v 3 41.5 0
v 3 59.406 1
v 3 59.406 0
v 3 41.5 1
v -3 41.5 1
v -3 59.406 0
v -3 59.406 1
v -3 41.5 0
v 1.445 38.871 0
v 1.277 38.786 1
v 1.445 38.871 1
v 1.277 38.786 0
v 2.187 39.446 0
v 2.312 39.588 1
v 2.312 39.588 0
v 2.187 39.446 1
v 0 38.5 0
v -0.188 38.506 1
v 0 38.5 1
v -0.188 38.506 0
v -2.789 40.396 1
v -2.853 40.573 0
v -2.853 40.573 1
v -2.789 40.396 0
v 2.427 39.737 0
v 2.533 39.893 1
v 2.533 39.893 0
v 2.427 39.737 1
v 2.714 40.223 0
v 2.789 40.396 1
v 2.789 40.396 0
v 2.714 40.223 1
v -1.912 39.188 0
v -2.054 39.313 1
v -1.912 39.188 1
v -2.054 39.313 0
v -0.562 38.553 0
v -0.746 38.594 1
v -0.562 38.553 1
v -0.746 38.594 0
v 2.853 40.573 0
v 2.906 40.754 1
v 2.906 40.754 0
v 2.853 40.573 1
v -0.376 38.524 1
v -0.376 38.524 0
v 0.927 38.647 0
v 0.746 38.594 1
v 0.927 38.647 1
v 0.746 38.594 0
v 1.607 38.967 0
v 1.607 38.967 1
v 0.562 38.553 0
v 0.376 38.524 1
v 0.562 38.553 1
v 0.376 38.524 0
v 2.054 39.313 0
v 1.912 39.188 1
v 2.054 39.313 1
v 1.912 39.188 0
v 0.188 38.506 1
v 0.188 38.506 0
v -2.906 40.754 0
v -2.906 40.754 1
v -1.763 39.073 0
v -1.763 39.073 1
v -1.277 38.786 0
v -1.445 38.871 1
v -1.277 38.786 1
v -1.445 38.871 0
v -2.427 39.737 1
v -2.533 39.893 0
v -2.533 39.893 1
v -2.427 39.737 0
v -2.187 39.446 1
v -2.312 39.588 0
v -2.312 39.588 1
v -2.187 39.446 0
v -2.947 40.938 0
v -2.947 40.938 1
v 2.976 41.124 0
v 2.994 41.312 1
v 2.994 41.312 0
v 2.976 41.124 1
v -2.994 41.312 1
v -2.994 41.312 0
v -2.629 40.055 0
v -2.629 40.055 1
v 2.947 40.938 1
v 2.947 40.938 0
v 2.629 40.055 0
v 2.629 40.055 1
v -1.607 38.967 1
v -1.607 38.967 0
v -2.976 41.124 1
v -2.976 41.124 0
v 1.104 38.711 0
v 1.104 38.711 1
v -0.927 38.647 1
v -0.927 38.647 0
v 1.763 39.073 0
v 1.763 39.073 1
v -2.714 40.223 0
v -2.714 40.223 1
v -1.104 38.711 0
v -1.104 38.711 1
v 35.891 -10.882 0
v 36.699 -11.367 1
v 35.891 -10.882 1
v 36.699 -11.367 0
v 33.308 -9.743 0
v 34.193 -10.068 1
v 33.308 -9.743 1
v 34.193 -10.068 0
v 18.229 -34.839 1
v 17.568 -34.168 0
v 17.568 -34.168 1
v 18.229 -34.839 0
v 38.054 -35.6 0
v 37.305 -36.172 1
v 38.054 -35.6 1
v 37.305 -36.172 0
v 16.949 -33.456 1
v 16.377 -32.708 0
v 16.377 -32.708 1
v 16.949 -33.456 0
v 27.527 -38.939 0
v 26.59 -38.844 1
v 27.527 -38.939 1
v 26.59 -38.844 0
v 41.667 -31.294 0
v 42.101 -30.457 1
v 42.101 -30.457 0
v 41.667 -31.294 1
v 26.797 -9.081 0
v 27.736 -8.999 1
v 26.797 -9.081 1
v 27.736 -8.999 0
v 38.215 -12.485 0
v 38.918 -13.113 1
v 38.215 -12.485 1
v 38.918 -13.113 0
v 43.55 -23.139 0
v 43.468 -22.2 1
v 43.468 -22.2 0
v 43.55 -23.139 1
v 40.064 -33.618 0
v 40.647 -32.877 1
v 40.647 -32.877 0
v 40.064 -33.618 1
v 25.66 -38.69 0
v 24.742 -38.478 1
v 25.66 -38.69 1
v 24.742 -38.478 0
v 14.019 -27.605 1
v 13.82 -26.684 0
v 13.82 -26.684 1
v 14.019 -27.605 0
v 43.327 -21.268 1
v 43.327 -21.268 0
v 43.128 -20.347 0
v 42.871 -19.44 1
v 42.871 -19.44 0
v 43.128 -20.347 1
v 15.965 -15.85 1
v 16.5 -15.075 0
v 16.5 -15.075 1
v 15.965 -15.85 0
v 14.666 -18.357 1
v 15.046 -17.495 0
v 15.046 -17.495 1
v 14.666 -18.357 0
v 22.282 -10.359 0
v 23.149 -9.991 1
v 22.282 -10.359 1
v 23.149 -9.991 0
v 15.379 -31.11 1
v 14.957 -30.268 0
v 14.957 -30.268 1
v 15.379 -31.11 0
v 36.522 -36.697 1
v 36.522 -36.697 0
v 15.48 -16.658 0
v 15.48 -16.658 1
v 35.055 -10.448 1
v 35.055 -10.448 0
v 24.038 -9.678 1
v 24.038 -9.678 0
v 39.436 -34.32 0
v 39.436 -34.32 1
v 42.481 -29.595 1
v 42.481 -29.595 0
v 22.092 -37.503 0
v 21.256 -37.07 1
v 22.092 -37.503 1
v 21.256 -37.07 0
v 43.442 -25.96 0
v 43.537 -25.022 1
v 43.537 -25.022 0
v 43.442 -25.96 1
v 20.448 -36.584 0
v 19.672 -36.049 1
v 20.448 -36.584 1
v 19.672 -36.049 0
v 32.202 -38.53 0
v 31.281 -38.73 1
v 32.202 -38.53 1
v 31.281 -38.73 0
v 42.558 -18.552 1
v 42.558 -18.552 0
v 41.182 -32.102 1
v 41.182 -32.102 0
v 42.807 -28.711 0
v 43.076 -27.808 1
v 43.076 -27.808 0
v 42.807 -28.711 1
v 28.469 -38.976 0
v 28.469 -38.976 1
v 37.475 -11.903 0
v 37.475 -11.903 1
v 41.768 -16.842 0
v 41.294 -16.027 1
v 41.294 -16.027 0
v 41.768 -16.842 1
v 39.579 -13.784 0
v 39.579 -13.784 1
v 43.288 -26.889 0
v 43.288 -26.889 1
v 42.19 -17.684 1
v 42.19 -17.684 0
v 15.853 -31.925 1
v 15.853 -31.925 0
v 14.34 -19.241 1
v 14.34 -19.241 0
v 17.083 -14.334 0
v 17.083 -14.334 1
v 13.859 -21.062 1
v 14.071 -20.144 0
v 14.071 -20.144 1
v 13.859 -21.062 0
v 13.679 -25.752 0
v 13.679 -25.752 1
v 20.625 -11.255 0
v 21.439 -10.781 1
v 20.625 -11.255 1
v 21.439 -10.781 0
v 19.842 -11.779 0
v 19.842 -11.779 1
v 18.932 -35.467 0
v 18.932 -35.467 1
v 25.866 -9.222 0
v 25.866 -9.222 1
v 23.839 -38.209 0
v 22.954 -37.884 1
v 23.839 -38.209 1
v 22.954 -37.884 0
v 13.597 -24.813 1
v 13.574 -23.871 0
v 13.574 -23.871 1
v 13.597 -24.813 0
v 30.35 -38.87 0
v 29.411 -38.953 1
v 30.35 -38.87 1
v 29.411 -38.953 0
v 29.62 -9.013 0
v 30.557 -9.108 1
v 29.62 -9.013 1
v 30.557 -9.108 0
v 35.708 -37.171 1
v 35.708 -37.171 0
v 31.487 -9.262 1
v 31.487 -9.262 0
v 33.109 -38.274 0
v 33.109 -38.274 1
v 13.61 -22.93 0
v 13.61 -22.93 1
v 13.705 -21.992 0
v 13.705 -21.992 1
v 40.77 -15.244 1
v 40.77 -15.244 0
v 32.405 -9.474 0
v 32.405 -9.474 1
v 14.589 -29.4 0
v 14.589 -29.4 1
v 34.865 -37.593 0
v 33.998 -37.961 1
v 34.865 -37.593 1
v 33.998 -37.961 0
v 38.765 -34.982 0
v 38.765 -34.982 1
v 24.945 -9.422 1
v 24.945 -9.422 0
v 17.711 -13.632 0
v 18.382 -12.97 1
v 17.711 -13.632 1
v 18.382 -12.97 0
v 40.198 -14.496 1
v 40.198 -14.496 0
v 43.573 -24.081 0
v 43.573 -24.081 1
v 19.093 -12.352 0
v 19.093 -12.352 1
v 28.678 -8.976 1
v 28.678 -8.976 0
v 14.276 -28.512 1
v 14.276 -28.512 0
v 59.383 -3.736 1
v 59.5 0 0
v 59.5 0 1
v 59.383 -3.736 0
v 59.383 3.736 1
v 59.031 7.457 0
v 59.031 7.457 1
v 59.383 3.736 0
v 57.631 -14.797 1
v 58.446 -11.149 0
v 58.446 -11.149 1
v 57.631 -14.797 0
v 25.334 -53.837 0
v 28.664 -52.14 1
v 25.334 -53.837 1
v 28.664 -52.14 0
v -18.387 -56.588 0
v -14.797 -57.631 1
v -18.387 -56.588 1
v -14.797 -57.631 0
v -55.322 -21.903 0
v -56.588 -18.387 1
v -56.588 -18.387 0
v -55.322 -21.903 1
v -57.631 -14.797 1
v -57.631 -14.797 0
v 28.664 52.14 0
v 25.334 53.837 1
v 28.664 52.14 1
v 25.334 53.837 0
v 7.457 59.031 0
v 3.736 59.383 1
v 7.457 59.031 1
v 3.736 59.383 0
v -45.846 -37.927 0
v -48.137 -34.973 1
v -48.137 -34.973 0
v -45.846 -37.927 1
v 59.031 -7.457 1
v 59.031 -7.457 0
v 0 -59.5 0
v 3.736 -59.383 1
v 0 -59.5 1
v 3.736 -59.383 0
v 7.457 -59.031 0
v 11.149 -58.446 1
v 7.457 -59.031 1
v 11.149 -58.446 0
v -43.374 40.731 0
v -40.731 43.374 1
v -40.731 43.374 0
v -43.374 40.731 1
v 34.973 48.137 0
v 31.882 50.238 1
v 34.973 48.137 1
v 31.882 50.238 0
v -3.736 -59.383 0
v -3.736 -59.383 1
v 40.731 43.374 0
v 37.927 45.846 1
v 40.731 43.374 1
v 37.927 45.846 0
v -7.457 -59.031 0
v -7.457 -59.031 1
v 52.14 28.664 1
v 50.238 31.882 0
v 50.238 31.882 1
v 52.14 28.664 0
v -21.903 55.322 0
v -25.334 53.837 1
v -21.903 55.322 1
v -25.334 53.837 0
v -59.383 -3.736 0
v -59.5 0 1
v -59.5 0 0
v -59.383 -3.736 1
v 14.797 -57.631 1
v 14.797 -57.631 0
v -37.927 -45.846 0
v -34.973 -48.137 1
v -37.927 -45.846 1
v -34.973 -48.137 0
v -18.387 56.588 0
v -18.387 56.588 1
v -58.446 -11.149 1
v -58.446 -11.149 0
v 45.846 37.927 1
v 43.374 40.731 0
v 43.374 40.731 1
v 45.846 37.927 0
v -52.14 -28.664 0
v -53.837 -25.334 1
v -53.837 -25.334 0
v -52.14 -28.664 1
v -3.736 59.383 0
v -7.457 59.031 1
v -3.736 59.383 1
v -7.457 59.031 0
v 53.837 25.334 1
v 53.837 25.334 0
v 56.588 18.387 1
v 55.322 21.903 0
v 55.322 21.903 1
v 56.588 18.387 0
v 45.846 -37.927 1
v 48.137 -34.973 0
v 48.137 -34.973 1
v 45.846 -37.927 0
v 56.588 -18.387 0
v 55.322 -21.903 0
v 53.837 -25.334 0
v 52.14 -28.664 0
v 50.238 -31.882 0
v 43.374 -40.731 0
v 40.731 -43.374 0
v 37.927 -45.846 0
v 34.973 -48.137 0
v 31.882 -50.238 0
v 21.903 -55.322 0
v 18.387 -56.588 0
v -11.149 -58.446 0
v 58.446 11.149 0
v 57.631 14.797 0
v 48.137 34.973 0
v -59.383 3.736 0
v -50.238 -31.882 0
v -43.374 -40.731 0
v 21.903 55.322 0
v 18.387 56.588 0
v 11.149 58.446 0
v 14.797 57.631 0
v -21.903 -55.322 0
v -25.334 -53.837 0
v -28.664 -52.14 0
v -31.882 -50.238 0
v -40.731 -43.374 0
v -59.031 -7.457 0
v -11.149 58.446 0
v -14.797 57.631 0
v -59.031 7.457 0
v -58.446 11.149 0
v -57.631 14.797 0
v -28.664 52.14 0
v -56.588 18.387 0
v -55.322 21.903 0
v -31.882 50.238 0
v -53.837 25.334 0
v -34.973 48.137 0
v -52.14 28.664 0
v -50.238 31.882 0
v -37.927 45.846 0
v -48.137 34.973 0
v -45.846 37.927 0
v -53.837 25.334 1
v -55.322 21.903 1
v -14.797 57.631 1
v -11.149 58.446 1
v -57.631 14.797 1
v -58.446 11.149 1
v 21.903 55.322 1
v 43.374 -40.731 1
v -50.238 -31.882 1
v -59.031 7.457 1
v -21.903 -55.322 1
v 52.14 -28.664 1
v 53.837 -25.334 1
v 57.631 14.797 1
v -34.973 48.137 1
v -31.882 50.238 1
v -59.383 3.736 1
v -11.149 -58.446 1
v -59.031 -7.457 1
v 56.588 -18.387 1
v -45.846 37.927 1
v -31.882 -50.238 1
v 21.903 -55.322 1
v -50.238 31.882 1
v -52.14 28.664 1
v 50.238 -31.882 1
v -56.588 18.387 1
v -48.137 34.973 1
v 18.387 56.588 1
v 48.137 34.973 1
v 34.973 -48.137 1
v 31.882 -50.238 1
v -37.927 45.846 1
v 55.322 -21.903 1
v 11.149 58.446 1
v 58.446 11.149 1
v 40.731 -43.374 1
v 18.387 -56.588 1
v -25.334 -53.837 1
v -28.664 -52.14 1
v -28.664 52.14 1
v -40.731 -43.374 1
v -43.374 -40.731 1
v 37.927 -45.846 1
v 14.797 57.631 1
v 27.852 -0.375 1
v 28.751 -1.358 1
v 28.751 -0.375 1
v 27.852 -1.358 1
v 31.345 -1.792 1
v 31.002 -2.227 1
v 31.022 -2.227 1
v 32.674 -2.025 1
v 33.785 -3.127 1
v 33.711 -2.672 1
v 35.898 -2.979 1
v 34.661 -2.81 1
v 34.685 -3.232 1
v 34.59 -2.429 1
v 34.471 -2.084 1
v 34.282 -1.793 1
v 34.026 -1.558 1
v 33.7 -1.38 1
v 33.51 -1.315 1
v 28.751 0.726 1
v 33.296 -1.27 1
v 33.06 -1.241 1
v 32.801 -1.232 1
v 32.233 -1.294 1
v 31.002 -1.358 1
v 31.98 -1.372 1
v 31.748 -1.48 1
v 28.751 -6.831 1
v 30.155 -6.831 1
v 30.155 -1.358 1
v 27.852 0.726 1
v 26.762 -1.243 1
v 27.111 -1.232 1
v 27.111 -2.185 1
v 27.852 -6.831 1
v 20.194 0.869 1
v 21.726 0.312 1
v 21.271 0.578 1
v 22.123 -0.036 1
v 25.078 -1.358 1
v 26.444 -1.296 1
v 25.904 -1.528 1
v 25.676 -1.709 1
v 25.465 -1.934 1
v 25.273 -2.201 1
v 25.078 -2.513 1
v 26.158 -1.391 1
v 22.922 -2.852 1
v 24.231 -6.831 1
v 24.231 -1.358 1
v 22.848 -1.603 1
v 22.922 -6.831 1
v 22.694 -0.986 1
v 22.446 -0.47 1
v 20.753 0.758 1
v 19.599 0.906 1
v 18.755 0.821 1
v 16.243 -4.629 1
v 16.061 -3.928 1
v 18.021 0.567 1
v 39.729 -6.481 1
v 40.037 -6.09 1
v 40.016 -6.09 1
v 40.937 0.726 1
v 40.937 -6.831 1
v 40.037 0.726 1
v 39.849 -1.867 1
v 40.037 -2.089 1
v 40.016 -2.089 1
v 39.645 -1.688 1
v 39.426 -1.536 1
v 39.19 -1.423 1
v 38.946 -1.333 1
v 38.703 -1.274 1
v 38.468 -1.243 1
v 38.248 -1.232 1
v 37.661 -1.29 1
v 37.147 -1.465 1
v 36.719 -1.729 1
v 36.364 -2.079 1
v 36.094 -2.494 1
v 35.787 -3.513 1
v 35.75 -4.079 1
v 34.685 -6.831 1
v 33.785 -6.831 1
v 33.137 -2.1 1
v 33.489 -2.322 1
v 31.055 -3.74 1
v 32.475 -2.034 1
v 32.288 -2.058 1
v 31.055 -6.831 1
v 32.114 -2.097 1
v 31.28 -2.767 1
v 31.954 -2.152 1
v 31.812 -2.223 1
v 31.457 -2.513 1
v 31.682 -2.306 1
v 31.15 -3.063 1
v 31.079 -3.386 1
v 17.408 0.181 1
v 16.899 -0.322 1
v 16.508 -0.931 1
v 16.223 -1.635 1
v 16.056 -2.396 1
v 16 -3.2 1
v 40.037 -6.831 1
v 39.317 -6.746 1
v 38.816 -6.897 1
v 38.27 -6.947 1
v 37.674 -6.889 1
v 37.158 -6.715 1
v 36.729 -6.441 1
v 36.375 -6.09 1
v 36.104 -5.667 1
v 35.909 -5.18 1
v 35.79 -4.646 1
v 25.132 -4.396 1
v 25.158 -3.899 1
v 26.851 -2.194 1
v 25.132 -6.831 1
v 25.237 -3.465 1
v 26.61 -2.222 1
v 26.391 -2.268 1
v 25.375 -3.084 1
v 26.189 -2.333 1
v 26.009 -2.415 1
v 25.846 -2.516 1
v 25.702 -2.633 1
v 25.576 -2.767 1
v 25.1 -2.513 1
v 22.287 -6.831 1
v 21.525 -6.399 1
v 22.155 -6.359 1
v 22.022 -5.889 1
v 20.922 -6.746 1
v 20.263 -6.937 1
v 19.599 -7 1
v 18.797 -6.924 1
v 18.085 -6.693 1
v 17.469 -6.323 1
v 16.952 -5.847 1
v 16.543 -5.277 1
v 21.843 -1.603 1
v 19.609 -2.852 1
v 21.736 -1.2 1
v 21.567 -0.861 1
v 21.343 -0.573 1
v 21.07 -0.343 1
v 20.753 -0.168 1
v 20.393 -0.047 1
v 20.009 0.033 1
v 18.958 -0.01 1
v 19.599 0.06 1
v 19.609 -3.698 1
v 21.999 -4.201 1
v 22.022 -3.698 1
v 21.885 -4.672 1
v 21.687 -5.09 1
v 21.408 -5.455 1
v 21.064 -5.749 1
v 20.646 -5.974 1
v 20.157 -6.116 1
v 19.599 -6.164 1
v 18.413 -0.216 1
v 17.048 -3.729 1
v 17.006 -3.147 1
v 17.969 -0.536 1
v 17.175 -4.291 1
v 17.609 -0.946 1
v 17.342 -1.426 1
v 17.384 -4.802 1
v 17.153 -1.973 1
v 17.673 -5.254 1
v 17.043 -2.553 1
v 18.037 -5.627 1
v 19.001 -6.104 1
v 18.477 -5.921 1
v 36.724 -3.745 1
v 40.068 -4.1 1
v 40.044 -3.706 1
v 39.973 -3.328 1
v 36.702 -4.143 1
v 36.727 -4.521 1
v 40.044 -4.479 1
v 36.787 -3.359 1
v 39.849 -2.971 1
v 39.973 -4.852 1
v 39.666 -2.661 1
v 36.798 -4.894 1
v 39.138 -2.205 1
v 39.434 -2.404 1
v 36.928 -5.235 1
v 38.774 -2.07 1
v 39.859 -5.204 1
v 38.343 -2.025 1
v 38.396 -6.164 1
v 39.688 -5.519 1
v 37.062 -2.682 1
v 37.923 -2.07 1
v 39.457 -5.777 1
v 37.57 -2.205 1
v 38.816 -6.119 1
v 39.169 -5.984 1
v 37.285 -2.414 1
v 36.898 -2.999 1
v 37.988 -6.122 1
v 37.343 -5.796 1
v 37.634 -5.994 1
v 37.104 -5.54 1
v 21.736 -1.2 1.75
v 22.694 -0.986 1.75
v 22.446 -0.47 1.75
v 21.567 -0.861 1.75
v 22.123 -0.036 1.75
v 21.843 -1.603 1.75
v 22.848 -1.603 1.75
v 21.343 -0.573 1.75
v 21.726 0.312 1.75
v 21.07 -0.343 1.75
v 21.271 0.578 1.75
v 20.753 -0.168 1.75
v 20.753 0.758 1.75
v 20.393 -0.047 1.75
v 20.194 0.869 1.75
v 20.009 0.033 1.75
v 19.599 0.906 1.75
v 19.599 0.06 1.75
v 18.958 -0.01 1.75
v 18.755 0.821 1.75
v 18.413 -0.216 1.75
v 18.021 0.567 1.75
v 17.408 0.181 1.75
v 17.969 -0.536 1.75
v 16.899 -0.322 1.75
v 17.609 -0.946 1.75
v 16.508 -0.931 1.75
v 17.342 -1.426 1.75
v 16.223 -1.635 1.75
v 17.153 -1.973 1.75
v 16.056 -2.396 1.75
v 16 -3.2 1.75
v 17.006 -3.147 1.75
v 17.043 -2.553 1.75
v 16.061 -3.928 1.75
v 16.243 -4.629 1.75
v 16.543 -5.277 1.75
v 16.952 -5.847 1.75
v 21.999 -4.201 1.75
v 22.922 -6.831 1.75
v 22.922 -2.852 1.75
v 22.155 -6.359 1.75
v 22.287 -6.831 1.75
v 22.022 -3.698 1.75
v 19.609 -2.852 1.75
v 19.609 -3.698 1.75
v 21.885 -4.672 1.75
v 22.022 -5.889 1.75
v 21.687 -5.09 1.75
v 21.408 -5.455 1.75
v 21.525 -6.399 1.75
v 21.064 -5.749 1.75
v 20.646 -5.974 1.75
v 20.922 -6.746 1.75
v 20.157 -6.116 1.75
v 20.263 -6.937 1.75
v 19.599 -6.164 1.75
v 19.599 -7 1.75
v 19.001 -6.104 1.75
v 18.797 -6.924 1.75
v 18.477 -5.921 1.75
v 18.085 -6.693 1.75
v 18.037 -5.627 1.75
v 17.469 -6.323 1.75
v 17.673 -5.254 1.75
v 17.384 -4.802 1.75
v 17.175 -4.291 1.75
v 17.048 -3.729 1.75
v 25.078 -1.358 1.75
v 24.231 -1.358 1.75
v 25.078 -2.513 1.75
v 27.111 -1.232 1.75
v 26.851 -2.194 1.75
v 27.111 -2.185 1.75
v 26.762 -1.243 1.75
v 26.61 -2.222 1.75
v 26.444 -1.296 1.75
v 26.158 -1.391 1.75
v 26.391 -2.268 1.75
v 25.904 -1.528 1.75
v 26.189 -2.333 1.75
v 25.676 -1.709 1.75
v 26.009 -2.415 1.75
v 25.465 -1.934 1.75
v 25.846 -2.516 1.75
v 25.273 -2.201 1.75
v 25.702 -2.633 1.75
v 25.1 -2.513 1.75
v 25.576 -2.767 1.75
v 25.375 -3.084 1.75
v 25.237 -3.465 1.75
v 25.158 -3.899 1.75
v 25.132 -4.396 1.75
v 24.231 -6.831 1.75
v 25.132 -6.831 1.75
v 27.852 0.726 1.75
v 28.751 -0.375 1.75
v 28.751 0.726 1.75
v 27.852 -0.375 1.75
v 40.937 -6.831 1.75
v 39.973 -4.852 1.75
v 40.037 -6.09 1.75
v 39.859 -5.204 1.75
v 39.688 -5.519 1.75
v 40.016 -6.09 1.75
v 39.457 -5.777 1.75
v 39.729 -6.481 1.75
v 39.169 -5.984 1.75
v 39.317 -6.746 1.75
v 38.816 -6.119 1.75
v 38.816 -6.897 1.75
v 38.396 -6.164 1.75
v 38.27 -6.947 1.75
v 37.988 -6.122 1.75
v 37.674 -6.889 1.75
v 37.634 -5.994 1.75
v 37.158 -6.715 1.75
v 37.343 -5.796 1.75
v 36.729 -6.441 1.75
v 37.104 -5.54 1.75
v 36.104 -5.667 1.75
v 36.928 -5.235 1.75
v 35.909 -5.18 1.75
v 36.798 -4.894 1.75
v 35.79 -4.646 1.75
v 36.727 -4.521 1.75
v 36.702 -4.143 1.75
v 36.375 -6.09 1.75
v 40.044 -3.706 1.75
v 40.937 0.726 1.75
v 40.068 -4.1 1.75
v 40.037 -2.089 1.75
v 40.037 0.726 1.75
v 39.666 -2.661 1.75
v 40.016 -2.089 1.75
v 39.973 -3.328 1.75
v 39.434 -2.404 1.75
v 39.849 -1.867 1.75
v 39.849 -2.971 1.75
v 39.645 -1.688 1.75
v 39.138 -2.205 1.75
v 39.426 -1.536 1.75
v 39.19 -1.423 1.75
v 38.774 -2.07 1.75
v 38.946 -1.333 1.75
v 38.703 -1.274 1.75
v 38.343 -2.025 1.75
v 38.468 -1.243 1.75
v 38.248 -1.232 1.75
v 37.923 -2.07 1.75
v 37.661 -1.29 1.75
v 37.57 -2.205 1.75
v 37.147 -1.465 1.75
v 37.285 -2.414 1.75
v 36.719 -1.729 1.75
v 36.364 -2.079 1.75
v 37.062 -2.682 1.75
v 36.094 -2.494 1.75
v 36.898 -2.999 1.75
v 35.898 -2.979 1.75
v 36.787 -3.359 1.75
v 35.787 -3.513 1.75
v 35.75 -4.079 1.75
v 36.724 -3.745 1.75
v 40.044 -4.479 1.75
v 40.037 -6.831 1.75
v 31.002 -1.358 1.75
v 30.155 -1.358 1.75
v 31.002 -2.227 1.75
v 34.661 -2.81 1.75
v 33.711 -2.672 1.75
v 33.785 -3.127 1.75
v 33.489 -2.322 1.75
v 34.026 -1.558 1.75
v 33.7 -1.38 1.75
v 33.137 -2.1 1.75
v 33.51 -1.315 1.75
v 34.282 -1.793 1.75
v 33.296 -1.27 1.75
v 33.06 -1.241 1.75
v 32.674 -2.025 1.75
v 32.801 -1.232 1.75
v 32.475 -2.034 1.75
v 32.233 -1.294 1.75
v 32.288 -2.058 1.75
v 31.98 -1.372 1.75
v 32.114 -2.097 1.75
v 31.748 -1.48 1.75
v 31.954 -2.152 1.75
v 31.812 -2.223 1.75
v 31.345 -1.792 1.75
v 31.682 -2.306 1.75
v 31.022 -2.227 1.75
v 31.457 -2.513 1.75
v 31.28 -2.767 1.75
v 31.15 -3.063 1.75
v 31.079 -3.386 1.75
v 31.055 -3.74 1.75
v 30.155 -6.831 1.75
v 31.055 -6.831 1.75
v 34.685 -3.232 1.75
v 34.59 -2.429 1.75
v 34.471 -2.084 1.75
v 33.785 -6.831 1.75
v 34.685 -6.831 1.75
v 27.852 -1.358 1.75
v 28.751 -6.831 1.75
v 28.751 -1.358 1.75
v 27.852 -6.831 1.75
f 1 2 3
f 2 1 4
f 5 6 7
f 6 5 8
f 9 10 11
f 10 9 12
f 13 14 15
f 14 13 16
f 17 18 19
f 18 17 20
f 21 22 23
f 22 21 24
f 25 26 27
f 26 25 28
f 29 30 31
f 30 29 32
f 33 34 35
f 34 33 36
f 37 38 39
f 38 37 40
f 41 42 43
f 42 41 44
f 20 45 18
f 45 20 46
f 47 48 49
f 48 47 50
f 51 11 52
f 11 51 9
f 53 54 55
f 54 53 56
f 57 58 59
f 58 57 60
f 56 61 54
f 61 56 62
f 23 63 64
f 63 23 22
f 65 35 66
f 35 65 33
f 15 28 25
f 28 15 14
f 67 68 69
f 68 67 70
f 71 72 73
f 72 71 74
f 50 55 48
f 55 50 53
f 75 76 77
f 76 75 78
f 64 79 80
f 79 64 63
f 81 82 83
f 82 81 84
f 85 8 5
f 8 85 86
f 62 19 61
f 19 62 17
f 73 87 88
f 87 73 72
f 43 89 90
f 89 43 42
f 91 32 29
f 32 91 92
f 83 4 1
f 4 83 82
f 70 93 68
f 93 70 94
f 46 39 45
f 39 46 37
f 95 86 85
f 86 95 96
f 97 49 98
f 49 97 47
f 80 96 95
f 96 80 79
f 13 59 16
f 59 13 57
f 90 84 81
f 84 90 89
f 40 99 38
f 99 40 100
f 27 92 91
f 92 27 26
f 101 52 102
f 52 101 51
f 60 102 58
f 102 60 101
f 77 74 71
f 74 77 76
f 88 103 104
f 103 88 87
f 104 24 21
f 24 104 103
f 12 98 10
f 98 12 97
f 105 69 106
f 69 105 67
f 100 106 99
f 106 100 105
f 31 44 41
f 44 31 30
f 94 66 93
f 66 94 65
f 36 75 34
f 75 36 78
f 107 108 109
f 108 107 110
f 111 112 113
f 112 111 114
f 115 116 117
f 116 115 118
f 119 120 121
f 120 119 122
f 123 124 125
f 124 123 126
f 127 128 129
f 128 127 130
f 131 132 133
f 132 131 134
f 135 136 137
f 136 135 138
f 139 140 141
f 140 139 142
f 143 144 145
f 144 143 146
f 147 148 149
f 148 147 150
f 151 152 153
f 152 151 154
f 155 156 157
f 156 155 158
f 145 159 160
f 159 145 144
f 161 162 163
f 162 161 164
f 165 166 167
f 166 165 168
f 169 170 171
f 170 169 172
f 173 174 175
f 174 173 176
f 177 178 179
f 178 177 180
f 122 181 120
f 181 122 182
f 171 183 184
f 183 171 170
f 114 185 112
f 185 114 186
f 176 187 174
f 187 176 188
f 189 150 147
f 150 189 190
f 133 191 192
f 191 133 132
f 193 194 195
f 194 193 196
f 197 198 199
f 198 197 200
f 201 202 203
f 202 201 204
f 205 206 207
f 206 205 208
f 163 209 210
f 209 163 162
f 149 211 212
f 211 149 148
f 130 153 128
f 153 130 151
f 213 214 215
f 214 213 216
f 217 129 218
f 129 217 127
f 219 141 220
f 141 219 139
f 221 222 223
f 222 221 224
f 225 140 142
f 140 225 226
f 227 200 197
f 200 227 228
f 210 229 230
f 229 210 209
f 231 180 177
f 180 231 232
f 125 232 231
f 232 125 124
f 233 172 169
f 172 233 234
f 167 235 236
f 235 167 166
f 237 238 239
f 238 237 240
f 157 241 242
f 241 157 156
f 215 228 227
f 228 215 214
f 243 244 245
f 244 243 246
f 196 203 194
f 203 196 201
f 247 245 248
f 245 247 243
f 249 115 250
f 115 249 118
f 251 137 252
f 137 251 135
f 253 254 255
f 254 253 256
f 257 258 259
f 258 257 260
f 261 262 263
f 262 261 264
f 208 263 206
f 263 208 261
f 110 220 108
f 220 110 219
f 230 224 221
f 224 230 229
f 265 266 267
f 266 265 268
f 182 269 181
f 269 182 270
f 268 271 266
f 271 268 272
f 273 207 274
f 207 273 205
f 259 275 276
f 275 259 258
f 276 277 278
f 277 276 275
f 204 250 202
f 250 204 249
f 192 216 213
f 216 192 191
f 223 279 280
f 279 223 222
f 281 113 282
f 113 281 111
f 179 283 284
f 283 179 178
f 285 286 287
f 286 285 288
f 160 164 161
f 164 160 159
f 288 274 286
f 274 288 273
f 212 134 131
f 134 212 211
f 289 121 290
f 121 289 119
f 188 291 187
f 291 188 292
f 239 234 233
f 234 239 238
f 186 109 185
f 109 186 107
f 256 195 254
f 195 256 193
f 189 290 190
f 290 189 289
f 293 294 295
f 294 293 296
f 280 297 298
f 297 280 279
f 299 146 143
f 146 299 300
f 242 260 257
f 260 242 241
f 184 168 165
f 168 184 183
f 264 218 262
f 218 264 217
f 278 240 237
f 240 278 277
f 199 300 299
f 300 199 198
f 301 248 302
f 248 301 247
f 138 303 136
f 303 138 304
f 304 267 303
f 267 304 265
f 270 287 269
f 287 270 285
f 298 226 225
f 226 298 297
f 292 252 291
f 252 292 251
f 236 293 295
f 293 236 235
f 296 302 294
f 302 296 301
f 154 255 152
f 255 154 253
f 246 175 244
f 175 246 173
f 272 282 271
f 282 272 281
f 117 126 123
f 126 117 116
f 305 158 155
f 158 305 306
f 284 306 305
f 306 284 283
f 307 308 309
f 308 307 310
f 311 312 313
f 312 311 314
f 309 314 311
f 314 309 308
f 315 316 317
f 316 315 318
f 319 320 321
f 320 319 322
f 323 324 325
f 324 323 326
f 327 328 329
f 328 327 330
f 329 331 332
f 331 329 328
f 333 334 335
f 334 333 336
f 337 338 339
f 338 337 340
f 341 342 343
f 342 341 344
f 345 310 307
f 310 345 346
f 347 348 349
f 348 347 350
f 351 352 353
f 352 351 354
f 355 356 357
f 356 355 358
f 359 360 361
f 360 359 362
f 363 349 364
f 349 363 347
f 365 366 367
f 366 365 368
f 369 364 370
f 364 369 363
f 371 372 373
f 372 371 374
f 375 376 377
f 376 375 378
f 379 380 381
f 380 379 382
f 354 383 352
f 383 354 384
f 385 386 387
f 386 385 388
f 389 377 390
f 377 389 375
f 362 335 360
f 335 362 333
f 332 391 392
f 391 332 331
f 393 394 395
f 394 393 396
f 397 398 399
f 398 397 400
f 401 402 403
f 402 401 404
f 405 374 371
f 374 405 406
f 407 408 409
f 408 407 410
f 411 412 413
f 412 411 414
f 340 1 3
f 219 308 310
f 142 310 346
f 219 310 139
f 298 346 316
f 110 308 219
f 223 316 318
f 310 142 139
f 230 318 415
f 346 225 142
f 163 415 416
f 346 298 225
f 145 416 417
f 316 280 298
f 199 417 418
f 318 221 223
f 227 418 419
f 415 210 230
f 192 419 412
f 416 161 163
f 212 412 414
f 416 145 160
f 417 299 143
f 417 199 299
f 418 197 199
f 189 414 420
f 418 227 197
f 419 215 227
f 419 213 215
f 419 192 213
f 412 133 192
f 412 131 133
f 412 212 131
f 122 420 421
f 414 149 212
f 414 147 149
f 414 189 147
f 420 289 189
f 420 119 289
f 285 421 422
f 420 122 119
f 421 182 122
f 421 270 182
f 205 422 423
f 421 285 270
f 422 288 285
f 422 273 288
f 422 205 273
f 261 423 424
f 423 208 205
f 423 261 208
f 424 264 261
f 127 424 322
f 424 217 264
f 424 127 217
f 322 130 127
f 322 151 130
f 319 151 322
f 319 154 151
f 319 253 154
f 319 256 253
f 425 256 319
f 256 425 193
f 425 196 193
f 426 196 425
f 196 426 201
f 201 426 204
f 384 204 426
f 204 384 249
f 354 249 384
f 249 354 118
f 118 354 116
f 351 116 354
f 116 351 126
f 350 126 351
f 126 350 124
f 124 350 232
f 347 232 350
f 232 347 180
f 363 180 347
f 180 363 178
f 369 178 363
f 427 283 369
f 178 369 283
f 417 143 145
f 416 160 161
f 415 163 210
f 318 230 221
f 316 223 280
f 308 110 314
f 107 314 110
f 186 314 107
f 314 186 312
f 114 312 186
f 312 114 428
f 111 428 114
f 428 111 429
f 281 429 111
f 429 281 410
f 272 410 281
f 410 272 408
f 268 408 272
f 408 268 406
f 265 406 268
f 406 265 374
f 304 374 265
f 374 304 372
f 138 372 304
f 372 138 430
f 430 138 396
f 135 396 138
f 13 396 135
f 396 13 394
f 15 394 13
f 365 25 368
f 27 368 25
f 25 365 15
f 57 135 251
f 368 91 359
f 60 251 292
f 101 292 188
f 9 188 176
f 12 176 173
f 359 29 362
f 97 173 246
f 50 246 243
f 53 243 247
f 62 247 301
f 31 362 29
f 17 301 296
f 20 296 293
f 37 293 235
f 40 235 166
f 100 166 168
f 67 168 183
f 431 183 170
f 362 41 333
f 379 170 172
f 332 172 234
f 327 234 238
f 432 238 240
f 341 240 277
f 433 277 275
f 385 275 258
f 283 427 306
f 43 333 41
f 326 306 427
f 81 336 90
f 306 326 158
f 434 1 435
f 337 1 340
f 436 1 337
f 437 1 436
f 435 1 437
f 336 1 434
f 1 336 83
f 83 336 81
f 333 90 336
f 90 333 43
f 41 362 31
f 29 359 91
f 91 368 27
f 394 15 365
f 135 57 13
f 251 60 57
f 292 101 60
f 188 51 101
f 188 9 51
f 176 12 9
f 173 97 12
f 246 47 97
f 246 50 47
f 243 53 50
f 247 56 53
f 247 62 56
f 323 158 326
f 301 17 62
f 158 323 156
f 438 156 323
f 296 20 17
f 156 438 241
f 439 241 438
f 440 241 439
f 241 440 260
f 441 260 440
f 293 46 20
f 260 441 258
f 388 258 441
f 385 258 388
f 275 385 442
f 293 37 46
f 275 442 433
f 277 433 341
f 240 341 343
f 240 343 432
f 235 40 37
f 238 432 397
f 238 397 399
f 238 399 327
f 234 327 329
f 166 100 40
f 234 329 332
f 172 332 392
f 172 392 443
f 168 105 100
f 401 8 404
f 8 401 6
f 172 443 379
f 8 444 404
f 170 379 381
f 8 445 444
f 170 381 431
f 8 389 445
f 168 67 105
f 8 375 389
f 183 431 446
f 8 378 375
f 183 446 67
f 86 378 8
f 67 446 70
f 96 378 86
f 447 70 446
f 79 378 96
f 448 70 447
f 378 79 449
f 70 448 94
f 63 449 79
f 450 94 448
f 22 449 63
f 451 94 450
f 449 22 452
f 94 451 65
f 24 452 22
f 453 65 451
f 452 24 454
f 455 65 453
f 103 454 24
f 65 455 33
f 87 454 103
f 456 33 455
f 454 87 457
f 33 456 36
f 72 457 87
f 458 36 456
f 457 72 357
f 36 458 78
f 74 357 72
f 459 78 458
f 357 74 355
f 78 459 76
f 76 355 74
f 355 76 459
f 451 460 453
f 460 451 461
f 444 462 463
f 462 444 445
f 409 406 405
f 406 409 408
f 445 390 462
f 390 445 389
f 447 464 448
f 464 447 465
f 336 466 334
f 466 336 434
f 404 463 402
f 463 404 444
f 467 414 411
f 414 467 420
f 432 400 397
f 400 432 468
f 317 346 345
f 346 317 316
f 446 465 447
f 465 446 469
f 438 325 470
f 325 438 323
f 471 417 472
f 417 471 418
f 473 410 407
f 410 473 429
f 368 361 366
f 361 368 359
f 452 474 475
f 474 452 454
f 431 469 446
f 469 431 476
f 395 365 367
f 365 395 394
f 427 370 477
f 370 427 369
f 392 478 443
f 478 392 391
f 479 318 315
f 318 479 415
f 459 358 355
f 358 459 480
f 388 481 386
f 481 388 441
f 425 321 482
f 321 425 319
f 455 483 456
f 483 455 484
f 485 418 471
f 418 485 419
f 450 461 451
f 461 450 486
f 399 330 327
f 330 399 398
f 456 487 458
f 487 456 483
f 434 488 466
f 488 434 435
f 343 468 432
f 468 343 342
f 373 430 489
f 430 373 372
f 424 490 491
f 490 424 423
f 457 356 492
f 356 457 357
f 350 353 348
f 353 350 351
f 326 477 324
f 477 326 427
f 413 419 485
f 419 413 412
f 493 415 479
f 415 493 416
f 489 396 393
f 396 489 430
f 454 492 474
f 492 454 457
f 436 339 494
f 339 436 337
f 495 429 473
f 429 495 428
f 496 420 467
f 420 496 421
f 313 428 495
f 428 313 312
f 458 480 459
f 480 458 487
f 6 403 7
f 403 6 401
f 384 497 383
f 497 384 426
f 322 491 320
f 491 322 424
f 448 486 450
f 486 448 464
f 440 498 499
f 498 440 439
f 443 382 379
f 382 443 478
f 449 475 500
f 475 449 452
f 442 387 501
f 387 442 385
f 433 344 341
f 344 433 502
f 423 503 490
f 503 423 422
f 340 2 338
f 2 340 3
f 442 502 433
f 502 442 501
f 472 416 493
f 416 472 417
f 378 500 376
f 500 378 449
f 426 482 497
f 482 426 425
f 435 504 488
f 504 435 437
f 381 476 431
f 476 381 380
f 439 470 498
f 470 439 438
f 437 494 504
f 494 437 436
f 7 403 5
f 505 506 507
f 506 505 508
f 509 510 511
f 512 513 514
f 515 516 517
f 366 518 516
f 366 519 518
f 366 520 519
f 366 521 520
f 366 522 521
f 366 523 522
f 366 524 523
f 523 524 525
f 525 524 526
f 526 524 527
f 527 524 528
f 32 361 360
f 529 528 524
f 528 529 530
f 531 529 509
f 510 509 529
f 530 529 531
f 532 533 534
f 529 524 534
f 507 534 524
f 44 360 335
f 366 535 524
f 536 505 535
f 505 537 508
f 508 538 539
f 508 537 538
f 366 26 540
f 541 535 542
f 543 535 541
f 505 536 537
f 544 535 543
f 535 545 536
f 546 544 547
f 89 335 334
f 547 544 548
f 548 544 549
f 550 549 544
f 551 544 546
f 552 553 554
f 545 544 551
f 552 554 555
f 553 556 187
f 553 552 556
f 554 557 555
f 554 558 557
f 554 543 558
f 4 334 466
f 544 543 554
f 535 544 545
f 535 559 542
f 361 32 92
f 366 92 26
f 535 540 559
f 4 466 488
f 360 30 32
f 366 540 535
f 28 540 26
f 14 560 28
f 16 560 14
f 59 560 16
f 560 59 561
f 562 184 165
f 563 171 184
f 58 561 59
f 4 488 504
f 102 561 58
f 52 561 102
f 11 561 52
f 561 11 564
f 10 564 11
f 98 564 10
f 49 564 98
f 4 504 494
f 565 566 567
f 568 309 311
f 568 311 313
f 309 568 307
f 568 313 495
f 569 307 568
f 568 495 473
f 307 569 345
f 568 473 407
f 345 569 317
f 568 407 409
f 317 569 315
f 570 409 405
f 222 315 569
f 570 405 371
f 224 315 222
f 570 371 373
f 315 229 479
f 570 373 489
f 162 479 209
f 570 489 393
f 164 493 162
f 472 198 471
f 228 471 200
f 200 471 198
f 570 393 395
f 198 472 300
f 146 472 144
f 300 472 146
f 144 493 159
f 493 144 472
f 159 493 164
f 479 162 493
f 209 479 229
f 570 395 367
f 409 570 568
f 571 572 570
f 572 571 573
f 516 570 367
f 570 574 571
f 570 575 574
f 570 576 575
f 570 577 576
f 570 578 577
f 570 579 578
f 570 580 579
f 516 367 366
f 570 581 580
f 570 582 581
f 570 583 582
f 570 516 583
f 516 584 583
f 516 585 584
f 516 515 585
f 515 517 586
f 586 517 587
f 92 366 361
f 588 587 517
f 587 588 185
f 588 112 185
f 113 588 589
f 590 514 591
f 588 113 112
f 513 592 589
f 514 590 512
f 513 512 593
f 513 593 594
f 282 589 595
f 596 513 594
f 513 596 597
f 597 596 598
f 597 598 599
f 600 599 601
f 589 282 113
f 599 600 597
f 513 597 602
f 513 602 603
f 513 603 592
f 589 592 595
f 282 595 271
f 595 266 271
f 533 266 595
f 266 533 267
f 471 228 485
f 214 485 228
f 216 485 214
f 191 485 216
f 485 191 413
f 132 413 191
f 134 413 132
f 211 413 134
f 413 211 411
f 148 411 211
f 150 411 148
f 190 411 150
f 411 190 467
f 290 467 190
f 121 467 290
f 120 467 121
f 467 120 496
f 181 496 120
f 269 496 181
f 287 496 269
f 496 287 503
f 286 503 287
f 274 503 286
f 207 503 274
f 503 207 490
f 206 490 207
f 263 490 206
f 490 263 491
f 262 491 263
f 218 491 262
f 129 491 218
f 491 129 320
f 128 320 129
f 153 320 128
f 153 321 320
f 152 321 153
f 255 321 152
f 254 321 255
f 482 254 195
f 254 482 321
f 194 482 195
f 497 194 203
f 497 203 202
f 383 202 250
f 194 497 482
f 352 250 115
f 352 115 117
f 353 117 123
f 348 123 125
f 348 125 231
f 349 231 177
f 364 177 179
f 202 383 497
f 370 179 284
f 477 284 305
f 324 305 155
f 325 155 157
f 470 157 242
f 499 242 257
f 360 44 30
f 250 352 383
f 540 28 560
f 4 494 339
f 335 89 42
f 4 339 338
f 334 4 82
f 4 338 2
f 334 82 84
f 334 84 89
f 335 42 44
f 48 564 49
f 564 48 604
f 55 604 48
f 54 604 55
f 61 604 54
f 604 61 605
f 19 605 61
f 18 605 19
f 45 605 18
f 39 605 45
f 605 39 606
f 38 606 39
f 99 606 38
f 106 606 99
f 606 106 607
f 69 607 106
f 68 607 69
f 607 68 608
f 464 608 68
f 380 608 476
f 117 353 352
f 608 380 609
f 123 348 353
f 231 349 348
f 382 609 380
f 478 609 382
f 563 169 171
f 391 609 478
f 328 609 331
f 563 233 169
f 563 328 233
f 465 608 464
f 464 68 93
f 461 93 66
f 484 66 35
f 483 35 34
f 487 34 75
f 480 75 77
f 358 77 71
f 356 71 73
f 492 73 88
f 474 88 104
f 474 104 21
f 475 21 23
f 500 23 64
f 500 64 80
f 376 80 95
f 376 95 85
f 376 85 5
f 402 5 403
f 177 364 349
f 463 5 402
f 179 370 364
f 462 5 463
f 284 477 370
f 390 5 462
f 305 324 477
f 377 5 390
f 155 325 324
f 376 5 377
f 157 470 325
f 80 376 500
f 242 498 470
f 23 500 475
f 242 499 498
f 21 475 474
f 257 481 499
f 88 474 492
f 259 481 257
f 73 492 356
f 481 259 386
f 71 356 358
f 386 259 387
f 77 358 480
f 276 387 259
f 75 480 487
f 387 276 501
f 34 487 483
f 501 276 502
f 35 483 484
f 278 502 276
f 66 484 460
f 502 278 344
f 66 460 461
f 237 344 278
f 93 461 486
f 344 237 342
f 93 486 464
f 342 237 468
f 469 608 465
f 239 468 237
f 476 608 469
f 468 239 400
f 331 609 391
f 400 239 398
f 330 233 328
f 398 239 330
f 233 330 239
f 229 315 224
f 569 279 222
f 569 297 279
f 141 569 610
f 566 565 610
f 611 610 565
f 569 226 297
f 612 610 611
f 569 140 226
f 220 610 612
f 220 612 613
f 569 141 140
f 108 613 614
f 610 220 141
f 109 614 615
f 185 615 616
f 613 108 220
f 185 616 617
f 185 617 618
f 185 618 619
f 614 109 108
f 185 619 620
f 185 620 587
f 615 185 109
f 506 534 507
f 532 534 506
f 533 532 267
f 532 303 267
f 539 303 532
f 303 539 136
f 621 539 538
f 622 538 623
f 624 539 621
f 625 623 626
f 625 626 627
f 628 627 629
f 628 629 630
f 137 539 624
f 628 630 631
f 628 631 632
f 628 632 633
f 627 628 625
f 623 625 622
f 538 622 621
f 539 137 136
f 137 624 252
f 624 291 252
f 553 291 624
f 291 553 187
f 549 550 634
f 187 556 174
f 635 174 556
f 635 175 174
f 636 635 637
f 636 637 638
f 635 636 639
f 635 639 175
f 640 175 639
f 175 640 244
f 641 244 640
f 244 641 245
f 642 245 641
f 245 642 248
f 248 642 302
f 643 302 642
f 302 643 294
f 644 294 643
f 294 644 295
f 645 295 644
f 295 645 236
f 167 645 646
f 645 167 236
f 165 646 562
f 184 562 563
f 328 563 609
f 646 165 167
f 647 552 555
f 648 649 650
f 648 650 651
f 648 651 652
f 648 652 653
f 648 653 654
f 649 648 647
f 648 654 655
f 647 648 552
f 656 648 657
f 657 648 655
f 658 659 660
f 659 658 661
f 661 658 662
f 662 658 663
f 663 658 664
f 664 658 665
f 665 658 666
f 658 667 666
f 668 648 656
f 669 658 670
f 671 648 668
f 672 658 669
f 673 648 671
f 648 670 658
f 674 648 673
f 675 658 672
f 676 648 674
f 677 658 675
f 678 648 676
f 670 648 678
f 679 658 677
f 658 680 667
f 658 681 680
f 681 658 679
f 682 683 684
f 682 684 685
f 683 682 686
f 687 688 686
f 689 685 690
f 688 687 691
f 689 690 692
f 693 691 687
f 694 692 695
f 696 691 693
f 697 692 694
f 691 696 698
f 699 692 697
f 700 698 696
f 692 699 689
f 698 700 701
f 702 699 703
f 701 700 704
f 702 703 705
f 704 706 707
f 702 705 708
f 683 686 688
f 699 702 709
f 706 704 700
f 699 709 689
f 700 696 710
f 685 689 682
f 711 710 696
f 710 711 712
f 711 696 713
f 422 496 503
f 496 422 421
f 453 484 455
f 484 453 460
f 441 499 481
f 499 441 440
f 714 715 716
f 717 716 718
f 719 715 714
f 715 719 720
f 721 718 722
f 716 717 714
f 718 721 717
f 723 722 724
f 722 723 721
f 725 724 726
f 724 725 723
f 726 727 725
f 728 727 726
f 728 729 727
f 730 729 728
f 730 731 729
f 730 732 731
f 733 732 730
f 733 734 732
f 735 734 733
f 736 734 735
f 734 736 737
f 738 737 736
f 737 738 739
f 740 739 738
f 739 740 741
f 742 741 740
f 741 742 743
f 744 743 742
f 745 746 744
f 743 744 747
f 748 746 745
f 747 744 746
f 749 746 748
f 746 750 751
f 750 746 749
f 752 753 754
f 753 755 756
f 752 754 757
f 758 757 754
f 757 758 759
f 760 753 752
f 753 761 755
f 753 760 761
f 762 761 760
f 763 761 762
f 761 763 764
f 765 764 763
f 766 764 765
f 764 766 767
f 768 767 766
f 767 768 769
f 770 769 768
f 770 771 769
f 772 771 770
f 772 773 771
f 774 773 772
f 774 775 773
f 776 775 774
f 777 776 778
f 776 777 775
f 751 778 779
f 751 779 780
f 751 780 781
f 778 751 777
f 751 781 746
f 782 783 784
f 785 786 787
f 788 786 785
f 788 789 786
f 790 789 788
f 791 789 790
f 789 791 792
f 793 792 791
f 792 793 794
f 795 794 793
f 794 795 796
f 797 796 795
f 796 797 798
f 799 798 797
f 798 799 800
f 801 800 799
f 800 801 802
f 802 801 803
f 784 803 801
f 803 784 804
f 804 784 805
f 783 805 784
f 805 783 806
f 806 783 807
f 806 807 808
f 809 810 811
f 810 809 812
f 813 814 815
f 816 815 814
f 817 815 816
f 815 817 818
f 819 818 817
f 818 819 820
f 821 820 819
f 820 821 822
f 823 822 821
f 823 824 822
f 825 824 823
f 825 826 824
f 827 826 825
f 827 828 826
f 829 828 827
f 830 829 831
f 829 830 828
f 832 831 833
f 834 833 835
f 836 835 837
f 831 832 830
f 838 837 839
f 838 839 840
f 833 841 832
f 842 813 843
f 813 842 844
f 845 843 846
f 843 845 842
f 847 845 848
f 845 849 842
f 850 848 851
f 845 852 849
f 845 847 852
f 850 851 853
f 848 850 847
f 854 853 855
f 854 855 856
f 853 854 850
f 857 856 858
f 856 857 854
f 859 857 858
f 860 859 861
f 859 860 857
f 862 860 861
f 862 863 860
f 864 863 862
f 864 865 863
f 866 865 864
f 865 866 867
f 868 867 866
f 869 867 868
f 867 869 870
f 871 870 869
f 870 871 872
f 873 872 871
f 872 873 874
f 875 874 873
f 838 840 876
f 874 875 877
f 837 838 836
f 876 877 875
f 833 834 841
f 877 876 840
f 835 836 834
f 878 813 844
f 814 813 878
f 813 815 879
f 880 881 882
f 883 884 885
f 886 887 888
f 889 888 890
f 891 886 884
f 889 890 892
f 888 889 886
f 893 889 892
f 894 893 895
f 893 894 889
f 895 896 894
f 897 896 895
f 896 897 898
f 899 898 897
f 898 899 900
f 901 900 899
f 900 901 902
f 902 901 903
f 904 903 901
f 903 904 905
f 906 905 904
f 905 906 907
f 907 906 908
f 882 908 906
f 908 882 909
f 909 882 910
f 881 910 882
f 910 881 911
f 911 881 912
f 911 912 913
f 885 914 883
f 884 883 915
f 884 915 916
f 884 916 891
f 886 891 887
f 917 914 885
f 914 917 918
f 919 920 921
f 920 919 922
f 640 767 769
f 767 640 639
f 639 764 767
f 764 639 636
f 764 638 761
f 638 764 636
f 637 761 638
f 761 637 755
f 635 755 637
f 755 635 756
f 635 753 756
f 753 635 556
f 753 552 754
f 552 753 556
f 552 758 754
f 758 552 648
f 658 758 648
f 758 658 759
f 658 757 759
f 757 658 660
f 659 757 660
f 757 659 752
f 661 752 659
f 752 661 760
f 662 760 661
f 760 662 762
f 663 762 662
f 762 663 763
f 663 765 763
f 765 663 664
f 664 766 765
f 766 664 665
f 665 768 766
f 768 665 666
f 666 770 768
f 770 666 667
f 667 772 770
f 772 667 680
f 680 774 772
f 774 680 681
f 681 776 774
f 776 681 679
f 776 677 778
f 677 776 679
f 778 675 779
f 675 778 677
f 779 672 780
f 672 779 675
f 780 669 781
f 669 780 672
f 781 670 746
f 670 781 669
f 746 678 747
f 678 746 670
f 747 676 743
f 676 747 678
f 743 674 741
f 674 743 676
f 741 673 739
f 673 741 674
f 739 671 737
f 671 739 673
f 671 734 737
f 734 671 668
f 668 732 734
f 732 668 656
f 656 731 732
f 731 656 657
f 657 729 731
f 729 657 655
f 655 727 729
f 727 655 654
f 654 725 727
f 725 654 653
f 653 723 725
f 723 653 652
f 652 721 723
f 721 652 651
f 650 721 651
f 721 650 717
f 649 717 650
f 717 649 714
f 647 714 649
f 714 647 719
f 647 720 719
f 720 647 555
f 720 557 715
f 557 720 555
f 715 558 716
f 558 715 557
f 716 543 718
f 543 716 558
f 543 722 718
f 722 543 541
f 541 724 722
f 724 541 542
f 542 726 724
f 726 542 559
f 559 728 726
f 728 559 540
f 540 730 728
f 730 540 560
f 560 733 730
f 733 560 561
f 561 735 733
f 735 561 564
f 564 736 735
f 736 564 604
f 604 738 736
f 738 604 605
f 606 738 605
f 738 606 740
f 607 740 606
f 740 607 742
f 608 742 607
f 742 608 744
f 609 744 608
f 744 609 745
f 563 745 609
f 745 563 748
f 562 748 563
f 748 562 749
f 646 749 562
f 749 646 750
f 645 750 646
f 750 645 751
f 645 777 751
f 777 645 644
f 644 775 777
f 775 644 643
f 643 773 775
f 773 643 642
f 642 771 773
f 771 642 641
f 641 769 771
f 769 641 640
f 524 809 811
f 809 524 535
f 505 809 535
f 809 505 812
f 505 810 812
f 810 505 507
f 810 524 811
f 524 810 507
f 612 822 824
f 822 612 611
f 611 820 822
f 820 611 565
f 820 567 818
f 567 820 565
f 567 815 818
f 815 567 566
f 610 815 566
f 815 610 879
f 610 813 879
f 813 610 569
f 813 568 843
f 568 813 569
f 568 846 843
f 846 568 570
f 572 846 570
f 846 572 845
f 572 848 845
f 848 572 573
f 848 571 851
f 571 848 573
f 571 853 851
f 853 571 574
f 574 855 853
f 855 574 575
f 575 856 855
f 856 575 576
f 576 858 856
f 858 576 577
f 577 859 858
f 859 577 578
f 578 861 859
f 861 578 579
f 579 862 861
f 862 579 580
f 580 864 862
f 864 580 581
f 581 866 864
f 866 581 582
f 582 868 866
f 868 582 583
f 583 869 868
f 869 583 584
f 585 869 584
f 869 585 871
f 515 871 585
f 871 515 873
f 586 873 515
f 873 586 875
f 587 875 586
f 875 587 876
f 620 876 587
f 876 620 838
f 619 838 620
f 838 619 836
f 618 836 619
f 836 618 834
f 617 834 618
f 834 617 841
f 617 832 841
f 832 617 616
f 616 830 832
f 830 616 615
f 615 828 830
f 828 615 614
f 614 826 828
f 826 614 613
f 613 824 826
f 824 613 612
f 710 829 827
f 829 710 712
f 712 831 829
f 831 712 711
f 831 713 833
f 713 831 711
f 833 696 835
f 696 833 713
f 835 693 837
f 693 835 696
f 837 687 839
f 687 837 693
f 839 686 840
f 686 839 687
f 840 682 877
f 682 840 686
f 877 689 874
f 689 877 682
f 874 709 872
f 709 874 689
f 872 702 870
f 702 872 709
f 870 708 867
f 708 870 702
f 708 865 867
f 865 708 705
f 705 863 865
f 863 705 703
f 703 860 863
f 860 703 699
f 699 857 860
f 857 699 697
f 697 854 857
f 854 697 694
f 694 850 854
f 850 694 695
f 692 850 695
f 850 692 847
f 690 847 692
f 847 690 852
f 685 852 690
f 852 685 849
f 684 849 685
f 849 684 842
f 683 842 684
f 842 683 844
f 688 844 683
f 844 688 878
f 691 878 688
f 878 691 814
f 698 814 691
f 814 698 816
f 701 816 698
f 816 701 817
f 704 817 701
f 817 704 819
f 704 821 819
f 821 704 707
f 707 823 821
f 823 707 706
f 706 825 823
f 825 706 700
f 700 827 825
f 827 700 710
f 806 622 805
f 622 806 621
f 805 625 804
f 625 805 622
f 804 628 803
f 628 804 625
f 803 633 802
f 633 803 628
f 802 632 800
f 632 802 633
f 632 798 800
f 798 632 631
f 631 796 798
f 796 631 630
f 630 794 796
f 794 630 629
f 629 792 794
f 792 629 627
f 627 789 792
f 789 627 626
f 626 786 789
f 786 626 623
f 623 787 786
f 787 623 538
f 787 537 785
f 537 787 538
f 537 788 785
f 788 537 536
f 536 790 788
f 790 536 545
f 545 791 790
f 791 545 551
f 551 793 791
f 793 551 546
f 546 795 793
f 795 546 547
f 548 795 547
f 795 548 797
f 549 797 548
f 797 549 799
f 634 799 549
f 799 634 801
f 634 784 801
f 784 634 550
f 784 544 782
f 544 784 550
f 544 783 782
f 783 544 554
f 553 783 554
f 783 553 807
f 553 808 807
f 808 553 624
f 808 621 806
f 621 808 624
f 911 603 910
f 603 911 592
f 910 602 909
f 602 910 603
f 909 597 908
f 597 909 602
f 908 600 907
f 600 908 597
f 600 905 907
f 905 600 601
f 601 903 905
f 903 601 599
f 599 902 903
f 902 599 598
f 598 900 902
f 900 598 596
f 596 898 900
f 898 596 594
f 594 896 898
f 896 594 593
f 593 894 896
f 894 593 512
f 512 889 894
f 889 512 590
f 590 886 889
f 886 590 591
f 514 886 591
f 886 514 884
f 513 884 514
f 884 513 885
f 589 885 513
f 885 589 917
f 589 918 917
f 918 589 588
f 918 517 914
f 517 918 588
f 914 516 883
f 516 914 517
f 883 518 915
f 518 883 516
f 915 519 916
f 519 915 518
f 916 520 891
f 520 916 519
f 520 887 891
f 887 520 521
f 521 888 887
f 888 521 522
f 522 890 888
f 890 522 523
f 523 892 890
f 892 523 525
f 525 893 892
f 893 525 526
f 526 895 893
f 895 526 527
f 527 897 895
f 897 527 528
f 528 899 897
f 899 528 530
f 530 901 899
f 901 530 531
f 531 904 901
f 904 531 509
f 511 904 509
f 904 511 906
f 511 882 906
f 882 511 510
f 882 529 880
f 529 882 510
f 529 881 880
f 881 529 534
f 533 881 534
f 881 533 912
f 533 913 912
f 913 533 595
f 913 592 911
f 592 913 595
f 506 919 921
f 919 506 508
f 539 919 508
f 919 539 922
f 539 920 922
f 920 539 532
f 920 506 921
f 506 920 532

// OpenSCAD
$fn=100;
r=119/2;

notch=6;
difference(){
  cylinder(r=r, h=1);
  translate([0,0,-1])
    union(){
      rotate([0,0,-40])
        translate([37.3,0,0])
          cylinder(r=15, h=3);
      translate([0,r-18,0]){
      translate([-notch/2,0,0])
        cube([notch,19,3]);
        cylinder(r=notch/2,h=3);
        }
    }
}

color("red")
translate([16,-7,1.25])
linear_extrude(height = 1, center = true, convexity = 10)
   import (file = "grind.dxf");
